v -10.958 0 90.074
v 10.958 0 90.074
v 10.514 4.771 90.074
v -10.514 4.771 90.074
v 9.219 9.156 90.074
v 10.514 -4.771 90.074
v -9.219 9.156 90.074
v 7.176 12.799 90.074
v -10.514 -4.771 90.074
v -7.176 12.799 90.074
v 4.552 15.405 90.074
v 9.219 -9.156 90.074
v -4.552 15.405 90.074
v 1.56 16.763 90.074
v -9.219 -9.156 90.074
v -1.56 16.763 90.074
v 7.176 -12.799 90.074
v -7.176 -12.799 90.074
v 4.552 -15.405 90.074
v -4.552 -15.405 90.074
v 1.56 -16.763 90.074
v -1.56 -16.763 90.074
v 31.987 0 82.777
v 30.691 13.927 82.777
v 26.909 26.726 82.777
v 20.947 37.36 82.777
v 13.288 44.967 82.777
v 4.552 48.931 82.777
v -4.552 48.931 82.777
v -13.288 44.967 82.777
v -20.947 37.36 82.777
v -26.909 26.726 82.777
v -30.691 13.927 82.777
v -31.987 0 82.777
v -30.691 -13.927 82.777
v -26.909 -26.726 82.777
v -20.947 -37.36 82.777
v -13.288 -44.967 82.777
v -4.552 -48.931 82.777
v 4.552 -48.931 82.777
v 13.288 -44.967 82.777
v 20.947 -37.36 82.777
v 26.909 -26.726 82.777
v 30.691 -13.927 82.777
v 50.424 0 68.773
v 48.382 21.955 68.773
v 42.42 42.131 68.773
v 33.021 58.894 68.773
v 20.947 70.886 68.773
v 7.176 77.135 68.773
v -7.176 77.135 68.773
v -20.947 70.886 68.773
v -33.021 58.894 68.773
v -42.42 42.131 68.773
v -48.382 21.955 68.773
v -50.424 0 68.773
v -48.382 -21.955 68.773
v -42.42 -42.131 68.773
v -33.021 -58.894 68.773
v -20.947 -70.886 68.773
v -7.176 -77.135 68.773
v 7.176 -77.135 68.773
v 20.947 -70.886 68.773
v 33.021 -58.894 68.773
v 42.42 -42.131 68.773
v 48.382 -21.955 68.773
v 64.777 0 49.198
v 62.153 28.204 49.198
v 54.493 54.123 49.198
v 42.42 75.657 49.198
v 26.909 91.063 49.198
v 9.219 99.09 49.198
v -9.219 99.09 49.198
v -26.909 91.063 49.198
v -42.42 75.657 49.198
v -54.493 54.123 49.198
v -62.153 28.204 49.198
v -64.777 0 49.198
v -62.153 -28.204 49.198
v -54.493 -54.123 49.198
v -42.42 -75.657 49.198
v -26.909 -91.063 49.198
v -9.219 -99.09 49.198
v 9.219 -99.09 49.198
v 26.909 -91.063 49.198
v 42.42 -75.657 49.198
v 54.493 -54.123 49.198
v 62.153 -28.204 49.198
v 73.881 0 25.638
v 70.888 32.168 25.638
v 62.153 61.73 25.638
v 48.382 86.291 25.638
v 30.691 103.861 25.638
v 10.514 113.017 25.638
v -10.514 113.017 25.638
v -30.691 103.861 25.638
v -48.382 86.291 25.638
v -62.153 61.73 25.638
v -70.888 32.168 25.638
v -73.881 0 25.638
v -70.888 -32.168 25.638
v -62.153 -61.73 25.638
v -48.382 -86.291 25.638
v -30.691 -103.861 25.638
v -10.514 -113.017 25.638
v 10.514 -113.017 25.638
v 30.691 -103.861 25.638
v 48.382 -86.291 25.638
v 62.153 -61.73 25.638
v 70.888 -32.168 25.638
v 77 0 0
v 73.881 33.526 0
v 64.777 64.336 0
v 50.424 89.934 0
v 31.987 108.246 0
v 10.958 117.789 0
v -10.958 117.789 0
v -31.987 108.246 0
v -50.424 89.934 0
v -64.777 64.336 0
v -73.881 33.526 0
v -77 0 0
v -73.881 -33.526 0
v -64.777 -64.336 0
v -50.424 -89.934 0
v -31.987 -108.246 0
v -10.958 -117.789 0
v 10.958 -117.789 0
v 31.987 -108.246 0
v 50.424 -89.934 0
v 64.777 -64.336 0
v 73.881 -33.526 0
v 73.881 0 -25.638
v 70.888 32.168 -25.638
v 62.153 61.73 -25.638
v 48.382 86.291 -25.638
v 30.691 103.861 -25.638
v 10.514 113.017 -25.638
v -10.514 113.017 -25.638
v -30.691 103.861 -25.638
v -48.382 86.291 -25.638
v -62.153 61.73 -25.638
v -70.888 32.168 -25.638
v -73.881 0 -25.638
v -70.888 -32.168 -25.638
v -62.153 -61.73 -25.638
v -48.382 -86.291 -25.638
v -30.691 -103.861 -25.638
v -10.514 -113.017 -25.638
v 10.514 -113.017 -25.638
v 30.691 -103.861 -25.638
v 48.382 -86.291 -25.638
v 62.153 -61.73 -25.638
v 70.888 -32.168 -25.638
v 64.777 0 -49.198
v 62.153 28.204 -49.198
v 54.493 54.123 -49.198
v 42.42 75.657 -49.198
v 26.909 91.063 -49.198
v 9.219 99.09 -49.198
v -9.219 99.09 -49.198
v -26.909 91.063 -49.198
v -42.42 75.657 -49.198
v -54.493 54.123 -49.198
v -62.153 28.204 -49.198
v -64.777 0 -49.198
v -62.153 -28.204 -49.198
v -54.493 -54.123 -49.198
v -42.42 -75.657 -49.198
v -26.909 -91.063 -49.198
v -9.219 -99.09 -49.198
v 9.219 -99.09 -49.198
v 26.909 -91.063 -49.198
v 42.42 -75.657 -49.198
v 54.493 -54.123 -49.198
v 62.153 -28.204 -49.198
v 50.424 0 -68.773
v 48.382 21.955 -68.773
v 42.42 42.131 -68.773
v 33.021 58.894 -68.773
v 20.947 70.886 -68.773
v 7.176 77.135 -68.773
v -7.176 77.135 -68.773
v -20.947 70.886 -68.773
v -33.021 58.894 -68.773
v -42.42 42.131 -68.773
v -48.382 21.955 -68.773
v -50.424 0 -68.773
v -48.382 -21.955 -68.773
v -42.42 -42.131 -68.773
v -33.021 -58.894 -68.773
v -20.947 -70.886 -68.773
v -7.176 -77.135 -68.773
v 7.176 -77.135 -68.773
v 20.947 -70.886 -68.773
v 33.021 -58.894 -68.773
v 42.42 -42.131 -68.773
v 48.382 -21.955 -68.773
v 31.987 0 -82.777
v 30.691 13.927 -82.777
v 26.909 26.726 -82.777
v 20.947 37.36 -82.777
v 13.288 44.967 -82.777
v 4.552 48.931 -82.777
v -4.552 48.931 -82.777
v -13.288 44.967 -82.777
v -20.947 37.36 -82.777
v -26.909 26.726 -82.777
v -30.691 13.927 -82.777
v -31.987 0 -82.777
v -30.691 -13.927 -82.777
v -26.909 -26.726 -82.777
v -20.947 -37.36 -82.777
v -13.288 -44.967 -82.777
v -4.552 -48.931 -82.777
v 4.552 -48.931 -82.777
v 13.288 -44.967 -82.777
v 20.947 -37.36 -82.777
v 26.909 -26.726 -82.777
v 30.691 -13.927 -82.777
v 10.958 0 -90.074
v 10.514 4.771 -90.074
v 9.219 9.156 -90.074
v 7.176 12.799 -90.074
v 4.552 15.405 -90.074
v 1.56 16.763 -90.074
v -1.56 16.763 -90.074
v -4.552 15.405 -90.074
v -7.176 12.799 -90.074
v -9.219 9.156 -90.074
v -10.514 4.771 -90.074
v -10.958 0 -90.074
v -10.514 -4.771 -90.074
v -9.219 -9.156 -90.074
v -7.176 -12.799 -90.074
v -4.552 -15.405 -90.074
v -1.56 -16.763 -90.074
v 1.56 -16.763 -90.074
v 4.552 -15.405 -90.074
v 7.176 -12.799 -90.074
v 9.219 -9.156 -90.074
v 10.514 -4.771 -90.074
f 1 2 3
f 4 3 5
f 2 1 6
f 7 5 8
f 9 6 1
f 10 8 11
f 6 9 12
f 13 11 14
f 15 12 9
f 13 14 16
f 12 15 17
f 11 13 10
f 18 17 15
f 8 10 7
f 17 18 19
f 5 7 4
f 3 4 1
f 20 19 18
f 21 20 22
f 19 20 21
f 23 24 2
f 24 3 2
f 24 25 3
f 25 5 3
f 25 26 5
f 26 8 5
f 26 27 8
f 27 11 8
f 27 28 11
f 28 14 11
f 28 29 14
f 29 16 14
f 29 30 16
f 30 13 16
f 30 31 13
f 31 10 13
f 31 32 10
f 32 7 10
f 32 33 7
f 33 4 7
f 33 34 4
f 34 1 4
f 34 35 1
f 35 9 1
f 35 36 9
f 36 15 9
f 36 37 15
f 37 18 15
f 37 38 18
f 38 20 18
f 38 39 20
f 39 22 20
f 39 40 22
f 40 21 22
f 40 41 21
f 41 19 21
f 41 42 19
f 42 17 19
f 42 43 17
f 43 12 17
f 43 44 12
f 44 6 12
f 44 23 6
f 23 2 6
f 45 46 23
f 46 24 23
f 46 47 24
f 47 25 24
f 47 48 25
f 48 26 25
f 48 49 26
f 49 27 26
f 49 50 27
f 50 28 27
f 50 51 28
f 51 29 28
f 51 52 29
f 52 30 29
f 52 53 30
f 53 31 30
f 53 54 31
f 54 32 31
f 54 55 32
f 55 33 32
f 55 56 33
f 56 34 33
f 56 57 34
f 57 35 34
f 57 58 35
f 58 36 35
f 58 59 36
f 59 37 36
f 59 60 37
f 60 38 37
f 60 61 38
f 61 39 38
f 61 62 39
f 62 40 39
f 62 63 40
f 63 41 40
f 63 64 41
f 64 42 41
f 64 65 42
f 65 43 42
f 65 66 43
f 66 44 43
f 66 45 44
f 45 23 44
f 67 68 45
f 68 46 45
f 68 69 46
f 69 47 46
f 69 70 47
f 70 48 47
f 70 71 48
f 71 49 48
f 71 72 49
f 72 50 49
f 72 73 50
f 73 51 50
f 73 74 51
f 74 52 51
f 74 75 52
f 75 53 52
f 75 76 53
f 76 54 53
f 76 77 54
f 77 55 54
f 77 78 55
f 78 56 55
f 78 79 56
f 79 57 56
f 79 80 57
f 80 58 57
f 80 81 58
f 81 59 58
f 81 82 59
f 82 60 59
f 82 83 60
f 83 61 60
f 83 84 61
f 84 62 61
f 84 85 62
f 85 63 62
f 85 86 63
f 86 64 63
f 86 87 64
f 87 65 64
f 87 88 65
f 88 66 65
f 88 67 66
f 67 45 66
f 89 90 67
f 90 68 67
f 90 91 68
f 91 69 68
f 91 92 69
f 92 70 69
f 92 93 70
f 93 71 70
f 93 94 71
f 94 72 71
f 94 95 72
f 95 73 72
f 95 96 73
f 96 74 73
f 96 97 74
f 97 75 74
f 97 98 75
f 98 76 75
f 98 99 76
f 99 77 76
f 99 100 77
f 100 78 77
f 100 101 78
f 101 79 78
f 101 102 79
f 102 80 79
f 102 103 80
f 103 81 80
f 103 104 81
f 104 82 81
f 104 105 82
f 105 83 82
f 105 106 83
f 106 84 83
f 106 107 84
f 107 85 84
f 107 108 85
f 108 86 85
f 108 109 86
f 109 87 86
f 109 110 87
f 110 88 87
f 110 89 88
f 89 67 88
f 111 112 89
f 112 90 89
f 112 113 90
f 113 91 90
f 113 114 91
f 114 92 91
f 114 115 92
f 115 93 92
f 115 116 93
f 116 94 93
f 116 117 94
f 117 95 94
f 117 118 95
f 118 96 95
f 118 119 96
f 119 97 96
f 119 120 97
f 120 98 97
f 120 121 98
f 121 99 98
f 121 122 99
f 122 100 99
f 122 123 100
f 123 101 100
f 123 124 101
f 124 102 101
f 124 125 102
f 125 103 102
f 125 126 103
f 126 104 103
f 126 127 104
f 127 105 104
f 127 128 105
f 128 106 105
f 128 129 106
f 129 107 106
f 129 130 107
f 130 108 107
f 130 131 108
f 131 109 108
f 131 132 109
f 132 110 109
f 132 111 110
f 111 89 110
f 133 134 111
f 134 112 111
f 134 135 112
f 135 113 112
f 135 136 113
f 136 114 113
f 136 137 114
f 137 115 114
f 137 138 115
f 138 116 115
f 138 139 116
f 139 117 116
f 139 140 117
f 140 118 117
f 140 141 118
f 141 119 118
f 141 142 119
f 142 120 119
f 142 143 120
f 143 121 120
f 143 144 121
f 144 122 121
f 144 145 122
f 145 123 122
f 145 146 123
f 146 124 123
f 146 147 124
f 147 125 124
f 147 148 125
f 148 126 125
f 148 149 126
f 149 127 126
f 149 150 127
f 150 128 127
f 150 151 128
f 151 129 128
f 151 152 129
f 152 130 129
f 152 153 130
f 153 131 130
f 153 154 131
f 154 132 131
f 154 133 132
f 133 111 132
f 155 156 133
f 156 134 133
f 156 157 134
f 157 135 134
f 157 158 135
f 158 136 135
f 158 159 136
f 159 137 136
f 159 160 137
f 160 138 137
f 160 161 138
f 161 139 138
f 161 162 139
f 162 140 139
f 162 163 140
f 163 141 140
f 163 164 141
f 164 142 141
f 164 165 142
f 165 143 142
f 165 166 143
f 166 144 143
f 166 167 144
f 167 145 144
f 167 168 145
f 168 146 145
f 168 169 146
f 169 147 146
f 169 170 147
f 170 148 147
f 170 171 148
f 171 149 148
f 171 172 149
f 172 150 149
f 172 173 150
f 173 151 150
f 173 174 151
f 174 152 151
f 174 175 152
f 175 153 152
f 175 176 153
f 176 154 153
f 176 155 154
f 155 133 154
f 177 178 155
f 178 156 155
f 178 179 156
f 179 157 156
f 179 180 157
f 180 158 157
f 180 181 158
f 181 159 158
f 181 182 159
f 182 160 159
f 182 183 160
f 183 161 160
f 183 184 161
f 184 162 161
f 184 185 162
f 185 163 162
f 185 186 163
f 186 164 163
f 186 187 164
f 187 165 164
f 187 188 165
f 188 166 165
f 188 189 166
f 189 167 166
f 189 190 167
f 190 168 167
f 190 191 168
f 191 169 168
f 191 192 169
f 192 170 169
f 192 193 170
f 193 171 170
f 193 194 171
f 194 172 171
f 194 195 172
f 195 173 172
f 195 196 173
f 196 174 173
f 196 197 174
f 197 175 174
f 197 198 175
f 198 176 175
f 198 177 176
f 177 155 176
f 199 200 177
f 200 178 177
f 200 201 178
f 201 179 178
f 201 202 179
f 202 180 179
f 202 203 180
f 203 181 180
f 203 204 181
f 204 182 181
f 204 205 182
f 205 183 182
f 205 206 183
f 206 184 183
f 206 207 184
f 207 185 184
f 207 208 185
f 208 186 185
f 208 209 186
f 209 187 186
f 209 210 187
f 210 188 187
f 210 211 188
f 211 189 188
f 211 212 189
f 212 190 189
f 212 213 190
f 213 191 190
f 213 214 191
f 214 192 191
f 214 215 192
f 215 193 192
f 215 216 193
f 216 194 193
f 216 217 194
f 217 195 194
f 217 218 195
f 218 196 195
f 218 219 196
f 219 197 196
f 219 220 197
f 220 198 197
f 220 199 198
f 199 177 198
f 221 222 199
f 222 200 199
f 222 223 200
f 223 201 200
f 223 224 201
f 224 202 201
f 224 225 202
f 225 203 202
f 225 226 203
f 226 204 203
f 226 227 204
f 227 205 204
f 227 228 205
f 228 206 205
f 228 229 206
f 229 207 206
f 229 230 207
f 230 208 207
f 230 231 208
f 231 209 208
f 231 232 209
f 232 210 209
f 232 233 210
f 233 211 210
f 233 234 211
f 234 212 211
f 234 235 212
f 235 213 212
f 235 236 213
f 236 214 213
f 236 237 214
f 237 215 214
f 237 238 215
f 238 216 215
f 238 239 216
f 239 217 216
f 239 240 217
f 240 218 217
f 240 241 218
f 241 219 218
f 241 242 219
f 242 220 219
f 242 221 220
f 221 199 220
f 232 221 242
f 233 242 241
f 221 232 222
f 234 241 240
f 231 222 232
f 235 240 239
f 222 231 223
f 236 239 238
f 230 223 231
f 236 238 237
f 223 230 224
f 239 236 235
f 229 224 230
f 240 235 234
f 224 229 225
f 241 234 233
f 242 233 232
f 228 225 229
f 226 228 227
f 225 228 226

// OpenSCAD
// Generated by SolidPython 1.0.1 on 2020-07-29 00:46:50


scale(v = [11, 17, 13]) {
	sphere(r = 7);
}
/***********************************************
*********      SolidPython code:      **********
************************************************
 
# import packages: SolidPython
from solid import *
from solid.utils import *
from itertools import chain, combinations, permutations


class Resize:

    def __init__(self, scad_file):
        self.scad_file = scad_file
        #self.scad_file = import_scad(scad_file)
        # cone/cylinder param:
        self.r1 = 0
        self.r2 = 0
        self.h = 0
        # rectangular prism param:
        self.w = 0
        self.l = 0
        # ellipse param:
        self.r = 0

    # import OpenScad code (file name corresponds to shape)


    # classify shape + parameters
    def assign(self, param1, param2, param3):
        if self.scad_file == 'cone.scad':
            self.r1 = param1
            self.r2 = param2
            self.h = param3
        elif self.scad_file == 'cylinder.scad':
            self.r1 = param1
            self.r2 = param2
            self.h = param3
        elif self.scad_file == 'rectangularPrism.scad':
            self.h = param1
            self.l = param2
            self.w = param3
        else:
            self.r = param1
            self.h = param2

    # resize parameters
    def iterate(self):
        x = range(3, 20, 2)
        i = 1
        if self.scad_file == 'cone.scad':
            tempList = list(permutations(x, 2))
            for temp in tempList:
                param1 = temp[0]
                param2 = temp[1]
                filepath = 'produced_scad_files/' + 'cone' + str(param1) + '_' + str(param2) + '_' + '.scad'
                scad_render_to_file(cylinder(h=param1, r1=param2, r2=0), filepath)

        elif self.scad_file == 'cylinder.scad':
            tempList = list(permutations(x, 3))
            for temp in tempList:
                param1 = temp[0]
                param2 = temp[1]
                filepath = 'produced_scad_files/' + 'cylinder' + str(param1) + '_' + str(param2) + '_' + '.scad'
                scad_render_to_file(cylinder(h=param1, r1=param2, r2=param2), filepath)

        elif self.scad_file == 'rectangularPrism.scad':
            tempList = list(permutations(x, 3))
            for temp in tempList:
                param1 = temp[0]
                param2 = temp[1]
                param3 = temp[2]
                filepath = 'produced_scad_files/' + 'rectangularPrism' + str(param1) + '_' + str(param2) + '_' + str(
                    param3) + '.scad'
                scad_render_to_file(cube(size=(param1, param2, param3)), filepath)

        elif self.scad_file == 'ellipse.scad':
            tempList = list(permutations(x, 4))
            for temp in tempList:
                param1 = temp[0]
                param2 = temp[1]
                param3 = temp[2]
                param4 = temp[3]
                filepath = 'produced_scad_files/' + 'ellipse' + str(param1) + '_' + str(param2) + '_' + str(param3) + '_' + str(param4) + '.scad'
                scad_render_to_file(scale([param1, param2, param3])(sphere(r=param4)), filepath)

    def render_to_scadfile(self):
        scad_render_to_file(scad, 'example.scad') 
 
************************************************/
